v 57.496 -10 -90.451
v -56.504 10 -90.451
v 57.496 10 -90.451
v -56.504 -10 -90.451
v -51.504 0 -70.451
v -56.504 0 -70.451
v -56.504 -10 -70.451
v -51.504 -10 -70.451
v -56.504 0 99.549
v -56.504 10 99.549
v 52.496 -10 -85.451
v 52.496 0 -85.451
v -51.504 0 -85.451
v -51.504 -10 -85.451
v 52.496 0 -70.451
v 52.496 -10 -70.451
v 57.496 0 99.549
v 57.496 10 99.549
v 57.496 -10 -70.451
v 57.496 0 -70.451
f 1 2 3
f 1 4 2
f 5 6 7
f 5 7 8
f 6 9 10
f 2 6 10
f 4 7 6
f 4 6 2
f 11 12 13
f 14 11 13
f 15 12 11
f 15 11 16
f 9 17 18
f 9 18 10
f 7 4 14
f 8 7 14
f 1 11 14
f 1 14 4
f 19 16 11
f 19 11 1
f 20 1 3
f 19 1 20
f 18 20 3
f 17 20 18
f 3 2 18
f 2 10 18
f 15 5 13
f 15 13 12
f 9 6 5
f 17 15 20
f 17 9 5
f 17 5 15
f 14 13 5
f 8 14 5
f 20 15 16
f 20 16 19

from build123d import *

# Parameters (mm, degrees)
F0_W     = 104
F0_H     = 5
F0_W_2   = 5
F0_H_2   = 15
F1_DEPTH = 10
F2_DEPTH = 10


with BuildPart() as f1:
    # F0 (on Front) → F1 (new body)
    with BuildSketch(Plane.XZ):
        with Locations((0.4955184162, -87.9514326147)):
            Rectangle(F0_W, F0_H)
        with Locations((-54.0044815838, -87.9514326147)):
            Rectangle(F0_W_2, F0_H)
        with Locations((-54.0044815838, -77.9514326147)):
            Rectangle(F0_W_2, F0_H_2)
        with Locations((54.9955184162, -77.9514326147)):
            Rectangle(F0_W_2, F0_H_2)
        with Locations((54.9955184162, -87.9514326147)):
            Rectangle(F0_W_2, F0_H)
    extrude(amount=F1_DEPTH)

    # F0 (on Front) → F2 (join)
    with BuildSketch(Plane.XZ):
        with Locations((-54.0044815838, -87.9514326147)):
            Rectangle(F0_W_2, F0_H)
        with Locations((54.9955184162, -87.9514326147)):
            Rectangle(F0_W_2, F0_H)
        with Locations((0.4955184162, -87.9514326147)):
            Rectangle(F0_W, F0_H)
        with Locations((-54.0044815838, -77.9514326147)):
            Rectangle(F0_W_2, F0_H_2)
        with Locations((54.9955184162, -77.9514326147)):
            Rectangle(F0_W_2, F0_H_2)
        with Locations((0.4955184162, -77.9514326147)):
            Rectangle(F0_W, F0_H_2)
        Polygon((57.4955184162, 99.5485673853), (-56.5044815838, 99.5485673853), (-56.5044815838, -70.4514326147), (-51.5044815838, -70.4514326147), (52.4955184162, -70.4514326147), (57.4955184162, -70.4514326147), align=None)
    extrude(amount=-F2_DEPTH)


solid = f1.part
